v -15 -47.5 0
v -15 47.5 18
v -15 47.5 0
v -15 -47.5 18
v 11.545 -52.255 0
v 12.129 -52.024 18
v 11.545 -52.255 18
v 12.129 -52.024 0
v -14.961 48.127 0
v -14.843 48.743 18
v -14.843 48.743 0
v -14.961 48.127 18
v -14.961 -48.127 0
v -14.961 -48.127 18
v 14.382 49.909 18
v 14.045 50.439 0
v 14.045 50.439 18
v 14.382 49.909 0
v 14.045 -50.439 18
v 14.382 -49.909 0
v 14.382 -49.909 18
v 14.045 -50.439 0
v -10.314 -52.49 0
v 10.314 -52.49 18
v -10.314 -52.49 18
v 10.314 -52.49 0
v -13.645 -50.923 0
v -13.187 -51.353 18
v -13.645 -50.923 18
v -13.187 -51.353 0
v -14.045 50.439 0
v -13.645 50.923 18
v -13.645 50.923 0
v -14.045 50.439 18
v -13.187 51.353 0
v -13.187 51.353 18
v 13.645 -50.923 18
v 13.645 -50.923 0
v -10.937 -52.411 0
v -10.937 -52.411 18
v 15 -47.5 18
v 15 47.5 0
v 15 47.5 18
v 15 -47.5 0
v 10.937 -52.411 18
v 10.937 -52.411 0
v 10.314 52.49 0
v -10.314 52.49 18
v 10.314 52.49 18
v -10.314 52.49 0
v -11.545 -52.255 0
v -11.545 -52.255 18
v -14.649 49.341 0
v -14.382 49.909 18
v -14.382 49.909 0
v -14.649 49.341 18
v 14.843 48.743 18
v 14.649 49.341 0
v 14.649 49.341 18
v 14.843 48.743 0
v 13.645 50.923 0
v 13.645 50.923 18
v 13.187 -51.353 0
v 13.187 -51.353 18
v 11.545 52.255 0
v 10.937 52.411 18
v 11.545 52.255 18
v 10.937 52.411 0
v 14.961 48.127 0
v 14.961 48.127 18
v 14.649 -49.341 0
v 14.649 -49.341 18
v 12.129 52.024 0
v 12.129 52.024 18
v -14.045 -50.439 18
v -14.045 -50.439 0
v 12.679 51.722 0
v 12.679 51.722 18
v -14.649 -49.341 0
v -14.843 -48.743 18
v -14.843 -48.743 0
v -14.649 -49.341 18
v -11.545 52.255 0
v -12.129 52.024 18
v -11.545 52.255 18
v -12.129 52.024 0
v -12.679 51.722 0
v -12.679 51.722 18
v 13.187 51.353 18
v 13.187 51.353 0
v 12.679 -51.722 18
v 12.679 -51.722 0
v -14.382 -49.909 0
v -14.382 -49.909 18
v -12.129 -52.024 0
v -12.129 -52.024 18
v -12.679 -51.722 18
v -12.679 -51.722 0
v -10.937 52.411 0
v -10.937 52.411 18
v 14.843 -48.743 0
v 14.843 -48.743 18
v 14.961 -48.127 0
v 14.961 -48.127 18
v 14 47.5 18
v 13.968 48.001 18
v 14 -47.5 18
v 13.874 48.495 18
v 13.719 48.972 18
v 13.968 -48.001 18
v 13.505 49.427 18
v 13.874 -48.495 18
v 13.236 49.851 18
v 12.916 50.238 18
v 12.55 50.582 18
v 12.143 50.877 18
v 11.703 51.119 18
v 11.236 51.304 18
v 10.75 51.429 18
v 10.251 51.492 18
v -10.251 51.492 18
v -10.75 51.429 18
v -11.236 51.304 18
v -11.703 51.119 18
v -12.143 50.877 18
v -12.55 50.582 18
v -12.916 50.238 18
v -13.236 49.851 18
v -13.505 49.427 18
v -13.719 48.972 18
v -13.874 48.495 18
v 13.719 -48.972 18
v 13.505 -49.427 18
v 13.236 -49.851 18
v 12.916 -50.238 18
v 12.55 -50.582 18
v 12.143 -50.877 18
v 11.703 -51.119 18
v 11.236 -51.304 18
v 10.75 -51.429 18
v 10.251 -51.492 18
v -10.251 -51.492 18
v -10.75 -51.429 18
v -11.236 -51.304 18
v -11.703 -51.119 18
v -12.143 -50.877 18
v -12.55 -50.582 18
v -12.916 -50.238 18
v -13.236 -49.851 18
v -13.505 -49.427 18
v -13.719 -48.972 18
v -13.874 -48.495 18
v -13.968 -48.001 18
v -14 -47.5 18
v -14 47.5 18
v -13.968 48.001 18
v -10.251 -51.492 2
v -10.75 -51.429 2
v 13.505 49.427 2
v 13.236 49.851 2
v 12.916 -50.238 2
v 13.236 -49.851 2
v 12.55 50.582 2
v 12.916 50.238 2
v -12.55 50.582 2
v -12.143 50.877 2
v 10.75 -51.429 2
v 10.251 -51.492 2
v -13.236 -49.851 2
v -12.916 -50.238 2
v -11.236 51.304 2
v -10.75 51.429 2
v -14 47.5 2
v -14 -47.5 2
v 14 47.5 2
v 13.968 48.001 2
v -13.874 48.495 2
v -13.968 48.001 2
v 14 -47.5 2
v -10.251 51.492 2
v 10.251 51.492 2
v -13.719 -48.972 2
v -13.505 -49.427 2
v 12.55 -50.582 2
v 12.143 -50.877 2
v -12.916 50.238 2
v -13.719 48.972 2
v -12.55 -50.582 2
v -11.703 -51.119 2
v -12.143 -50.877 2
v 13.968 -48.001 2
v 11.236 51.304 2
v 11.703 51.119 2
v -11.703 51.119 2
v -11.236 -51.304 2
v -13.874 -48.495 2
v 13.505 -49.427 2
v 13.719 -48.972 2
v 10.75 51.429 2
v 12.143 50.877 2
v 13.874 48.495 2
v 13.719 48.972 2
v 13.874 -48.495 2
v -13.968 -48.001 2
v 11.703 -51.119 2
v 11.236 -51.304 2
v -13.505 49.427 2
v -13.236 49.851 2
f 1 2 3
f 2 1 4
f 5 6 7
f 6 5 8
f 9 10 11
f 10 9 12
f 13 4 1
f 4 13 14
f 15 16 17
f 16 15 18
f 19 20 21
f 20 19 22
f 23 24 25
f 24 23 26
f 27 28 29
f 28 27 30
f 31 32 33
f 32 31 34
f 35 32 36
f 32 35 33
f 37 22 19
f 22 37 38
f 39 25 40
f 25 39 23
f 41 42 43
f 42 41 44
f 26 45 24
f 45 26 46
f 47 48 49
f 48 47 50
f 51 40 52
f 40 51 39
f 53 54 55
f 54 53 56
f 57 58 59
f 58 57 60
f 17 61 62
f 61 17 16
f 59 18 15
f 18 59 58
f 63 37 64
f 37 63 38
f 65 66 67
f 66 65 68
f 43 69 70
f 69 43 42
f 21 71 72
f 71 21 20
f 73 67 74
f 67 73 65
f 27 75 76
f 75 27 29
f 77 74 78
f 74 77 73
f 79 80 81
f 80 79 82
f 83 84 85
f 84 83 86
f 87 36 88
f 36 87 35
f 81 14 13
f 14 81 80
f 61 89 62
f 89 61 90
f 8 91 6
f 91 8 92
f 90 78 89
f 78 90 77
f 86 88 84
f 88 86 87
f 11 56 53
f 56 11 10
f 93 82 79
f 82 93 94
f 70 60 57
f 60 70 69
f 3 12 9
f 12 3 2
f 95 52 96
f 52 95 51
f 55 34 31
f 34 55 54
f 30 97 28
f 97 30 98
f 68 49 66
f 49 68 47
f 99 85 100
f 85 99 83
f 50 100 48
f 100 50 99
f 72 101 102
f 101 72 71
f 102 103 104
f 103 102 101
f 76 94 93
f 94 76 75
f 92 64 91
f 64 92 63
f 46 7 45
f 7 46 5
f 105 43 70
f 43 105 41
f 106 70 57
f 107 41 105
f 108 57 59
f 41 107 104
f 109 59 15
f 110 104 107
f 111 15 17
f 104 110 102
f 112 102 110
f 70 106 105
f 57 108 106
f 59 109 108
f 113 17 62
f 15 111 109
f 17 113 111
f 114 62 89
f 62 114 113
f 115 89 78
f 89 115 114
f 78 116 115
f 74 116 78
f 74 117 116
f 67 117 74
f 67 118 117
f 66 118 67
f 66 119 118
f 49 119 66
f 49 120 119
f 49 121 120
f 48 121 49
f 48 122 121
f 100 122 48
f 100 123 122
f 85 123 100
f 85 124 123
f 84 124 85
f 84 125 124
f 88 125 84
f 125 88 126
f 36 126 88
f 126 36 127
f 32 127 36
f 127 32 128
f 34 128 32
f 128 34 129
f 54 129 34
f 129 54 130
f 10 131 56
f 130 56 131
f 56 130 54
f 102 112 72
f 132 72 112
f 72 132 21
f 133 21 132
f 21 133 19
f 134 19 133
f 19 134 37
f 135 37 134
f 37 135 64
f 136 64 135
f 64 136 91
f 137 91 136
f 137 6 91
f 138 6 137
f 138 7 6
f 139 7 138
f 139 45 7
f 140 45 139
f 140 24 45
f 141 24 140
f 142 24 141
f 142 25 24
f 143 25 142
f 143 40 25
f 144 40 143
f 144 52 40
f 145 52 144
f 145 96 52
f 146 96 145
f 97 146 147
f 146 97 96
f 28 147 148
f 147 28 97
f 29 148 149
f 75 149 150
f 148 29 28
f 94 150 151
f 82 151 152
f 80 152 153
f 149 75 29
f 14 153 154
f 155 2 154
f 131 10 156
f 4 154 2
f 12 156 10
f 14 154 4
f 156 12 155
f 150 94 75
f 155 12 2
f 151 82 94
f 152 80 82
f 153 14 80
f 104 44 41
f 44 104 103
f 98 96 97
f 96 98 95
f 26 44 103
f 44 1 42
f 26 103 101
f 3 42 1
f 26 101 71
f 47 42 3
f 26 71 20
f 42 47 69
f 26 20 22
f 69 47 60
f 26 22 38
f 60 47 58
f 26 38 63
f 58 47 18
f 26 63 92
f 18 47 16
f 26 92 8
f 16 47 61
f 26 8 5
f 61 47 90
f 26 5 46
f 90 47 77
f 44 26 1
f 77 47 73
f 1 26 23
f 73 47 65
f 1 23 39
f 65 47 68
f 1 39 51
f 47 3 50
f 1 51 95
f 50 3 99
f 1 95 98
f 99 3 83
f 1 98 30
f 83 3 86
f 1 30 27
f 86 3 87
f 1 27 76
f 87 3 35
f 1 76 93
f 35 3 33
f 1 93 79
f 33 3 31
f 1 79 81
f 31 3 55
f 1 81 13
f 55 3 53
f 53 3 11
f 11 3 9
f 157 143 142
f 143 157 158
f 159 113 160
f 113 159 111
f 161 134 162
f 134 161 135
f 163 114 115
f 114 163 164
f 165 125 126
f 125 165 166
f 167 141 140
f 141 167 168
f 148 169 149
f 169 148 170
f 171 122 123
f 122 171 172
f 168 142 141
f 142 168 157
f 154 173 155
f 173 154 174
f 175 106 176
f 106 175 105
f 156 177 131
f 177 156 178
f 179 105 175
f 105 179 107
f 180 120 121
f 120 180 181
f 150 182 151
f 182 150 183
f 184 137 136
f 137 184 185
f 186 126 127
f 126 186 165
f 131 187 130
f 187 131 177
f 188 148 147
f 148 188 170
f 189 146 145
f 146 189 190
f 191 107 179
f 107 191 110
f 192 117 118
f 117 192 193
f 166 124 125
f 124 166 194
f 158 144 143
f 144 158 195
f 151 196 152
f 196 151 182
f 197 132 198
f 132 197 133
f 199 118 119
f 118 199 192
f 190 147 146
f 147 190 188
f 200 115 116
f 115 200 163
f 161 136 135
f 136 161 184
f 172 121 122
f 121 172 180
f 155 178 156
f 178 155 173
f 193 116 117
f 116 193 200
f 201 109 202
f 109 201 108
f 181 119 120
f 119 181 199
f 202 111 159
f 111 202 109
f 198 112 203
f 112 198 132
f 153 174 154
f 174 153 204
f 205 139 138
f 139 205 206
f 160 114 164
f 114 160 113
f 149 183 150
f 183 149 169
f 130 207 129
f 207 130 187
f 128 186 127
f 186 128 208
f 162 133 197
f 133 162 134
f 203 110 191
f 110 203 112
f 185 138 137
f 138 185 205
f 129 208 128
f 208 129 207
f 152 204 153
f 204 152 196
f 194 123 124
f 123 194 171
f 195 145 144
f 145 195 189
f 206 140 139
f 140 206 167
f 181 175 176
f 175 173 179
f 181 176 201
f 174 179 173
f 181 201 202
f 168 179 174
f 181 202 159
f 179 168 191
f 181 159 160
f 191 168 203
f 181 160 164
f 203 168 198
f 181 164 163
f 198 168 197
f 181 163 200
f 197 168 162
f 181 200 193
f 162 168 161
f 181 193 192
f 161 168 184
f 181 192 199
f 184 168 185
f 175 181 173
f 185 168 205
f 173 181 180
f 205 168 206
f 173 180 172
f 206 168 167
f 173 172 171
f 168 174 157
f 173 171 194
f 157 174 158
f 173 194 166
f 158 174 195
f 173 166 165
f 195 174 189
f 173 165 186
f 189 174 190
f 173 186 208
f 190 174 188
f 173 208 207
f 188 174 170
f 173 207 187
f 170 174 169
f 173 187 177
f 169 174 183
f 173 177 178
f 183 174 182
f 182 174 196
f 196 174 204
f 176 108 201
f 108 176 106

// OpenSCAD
$fn = 50;


difference() {
	union() {
		hull() {
			translate(v = [-10.0000000000, 47.5000000000, 0]) {
				cylinder(h = 18, r = 5);
			}
			translate(v = [10.0000000000, 47.5000000000, 0]) {
				cylinder(h = 18, r = 5);
			}
			translate(v = [-10.0000000000, -47.5000000000, 0]) {
				cylinder(h = 18, r = 5);
			}
			translate(v = [10.0000000000, -47.5000000000, 0]) {
				cylinder(h = 18, r = 5);
			}
		}
	}
	union() {
		translate(v = [0, 0, 2]) {
			hull() {
				translate(v = [-10.0000000000, 47.5000000000, 0]) {
					cylinder(h = 16, r = 4);
				}
				translate(v = [10.0000000000, 47.5000000000, 0]) {
					cylinder(h = 16, r = 4);
				}
				translate(v = [-10.0000000000, -47.5000000000, 0]) {
					cylinder(h = 16, r = 4);
				}
				translate(v = [10.0000000000, -47.5000000000, 0]) {
					cylinder(h = 16, r = 4);
				}
			}
		}
	}
}
